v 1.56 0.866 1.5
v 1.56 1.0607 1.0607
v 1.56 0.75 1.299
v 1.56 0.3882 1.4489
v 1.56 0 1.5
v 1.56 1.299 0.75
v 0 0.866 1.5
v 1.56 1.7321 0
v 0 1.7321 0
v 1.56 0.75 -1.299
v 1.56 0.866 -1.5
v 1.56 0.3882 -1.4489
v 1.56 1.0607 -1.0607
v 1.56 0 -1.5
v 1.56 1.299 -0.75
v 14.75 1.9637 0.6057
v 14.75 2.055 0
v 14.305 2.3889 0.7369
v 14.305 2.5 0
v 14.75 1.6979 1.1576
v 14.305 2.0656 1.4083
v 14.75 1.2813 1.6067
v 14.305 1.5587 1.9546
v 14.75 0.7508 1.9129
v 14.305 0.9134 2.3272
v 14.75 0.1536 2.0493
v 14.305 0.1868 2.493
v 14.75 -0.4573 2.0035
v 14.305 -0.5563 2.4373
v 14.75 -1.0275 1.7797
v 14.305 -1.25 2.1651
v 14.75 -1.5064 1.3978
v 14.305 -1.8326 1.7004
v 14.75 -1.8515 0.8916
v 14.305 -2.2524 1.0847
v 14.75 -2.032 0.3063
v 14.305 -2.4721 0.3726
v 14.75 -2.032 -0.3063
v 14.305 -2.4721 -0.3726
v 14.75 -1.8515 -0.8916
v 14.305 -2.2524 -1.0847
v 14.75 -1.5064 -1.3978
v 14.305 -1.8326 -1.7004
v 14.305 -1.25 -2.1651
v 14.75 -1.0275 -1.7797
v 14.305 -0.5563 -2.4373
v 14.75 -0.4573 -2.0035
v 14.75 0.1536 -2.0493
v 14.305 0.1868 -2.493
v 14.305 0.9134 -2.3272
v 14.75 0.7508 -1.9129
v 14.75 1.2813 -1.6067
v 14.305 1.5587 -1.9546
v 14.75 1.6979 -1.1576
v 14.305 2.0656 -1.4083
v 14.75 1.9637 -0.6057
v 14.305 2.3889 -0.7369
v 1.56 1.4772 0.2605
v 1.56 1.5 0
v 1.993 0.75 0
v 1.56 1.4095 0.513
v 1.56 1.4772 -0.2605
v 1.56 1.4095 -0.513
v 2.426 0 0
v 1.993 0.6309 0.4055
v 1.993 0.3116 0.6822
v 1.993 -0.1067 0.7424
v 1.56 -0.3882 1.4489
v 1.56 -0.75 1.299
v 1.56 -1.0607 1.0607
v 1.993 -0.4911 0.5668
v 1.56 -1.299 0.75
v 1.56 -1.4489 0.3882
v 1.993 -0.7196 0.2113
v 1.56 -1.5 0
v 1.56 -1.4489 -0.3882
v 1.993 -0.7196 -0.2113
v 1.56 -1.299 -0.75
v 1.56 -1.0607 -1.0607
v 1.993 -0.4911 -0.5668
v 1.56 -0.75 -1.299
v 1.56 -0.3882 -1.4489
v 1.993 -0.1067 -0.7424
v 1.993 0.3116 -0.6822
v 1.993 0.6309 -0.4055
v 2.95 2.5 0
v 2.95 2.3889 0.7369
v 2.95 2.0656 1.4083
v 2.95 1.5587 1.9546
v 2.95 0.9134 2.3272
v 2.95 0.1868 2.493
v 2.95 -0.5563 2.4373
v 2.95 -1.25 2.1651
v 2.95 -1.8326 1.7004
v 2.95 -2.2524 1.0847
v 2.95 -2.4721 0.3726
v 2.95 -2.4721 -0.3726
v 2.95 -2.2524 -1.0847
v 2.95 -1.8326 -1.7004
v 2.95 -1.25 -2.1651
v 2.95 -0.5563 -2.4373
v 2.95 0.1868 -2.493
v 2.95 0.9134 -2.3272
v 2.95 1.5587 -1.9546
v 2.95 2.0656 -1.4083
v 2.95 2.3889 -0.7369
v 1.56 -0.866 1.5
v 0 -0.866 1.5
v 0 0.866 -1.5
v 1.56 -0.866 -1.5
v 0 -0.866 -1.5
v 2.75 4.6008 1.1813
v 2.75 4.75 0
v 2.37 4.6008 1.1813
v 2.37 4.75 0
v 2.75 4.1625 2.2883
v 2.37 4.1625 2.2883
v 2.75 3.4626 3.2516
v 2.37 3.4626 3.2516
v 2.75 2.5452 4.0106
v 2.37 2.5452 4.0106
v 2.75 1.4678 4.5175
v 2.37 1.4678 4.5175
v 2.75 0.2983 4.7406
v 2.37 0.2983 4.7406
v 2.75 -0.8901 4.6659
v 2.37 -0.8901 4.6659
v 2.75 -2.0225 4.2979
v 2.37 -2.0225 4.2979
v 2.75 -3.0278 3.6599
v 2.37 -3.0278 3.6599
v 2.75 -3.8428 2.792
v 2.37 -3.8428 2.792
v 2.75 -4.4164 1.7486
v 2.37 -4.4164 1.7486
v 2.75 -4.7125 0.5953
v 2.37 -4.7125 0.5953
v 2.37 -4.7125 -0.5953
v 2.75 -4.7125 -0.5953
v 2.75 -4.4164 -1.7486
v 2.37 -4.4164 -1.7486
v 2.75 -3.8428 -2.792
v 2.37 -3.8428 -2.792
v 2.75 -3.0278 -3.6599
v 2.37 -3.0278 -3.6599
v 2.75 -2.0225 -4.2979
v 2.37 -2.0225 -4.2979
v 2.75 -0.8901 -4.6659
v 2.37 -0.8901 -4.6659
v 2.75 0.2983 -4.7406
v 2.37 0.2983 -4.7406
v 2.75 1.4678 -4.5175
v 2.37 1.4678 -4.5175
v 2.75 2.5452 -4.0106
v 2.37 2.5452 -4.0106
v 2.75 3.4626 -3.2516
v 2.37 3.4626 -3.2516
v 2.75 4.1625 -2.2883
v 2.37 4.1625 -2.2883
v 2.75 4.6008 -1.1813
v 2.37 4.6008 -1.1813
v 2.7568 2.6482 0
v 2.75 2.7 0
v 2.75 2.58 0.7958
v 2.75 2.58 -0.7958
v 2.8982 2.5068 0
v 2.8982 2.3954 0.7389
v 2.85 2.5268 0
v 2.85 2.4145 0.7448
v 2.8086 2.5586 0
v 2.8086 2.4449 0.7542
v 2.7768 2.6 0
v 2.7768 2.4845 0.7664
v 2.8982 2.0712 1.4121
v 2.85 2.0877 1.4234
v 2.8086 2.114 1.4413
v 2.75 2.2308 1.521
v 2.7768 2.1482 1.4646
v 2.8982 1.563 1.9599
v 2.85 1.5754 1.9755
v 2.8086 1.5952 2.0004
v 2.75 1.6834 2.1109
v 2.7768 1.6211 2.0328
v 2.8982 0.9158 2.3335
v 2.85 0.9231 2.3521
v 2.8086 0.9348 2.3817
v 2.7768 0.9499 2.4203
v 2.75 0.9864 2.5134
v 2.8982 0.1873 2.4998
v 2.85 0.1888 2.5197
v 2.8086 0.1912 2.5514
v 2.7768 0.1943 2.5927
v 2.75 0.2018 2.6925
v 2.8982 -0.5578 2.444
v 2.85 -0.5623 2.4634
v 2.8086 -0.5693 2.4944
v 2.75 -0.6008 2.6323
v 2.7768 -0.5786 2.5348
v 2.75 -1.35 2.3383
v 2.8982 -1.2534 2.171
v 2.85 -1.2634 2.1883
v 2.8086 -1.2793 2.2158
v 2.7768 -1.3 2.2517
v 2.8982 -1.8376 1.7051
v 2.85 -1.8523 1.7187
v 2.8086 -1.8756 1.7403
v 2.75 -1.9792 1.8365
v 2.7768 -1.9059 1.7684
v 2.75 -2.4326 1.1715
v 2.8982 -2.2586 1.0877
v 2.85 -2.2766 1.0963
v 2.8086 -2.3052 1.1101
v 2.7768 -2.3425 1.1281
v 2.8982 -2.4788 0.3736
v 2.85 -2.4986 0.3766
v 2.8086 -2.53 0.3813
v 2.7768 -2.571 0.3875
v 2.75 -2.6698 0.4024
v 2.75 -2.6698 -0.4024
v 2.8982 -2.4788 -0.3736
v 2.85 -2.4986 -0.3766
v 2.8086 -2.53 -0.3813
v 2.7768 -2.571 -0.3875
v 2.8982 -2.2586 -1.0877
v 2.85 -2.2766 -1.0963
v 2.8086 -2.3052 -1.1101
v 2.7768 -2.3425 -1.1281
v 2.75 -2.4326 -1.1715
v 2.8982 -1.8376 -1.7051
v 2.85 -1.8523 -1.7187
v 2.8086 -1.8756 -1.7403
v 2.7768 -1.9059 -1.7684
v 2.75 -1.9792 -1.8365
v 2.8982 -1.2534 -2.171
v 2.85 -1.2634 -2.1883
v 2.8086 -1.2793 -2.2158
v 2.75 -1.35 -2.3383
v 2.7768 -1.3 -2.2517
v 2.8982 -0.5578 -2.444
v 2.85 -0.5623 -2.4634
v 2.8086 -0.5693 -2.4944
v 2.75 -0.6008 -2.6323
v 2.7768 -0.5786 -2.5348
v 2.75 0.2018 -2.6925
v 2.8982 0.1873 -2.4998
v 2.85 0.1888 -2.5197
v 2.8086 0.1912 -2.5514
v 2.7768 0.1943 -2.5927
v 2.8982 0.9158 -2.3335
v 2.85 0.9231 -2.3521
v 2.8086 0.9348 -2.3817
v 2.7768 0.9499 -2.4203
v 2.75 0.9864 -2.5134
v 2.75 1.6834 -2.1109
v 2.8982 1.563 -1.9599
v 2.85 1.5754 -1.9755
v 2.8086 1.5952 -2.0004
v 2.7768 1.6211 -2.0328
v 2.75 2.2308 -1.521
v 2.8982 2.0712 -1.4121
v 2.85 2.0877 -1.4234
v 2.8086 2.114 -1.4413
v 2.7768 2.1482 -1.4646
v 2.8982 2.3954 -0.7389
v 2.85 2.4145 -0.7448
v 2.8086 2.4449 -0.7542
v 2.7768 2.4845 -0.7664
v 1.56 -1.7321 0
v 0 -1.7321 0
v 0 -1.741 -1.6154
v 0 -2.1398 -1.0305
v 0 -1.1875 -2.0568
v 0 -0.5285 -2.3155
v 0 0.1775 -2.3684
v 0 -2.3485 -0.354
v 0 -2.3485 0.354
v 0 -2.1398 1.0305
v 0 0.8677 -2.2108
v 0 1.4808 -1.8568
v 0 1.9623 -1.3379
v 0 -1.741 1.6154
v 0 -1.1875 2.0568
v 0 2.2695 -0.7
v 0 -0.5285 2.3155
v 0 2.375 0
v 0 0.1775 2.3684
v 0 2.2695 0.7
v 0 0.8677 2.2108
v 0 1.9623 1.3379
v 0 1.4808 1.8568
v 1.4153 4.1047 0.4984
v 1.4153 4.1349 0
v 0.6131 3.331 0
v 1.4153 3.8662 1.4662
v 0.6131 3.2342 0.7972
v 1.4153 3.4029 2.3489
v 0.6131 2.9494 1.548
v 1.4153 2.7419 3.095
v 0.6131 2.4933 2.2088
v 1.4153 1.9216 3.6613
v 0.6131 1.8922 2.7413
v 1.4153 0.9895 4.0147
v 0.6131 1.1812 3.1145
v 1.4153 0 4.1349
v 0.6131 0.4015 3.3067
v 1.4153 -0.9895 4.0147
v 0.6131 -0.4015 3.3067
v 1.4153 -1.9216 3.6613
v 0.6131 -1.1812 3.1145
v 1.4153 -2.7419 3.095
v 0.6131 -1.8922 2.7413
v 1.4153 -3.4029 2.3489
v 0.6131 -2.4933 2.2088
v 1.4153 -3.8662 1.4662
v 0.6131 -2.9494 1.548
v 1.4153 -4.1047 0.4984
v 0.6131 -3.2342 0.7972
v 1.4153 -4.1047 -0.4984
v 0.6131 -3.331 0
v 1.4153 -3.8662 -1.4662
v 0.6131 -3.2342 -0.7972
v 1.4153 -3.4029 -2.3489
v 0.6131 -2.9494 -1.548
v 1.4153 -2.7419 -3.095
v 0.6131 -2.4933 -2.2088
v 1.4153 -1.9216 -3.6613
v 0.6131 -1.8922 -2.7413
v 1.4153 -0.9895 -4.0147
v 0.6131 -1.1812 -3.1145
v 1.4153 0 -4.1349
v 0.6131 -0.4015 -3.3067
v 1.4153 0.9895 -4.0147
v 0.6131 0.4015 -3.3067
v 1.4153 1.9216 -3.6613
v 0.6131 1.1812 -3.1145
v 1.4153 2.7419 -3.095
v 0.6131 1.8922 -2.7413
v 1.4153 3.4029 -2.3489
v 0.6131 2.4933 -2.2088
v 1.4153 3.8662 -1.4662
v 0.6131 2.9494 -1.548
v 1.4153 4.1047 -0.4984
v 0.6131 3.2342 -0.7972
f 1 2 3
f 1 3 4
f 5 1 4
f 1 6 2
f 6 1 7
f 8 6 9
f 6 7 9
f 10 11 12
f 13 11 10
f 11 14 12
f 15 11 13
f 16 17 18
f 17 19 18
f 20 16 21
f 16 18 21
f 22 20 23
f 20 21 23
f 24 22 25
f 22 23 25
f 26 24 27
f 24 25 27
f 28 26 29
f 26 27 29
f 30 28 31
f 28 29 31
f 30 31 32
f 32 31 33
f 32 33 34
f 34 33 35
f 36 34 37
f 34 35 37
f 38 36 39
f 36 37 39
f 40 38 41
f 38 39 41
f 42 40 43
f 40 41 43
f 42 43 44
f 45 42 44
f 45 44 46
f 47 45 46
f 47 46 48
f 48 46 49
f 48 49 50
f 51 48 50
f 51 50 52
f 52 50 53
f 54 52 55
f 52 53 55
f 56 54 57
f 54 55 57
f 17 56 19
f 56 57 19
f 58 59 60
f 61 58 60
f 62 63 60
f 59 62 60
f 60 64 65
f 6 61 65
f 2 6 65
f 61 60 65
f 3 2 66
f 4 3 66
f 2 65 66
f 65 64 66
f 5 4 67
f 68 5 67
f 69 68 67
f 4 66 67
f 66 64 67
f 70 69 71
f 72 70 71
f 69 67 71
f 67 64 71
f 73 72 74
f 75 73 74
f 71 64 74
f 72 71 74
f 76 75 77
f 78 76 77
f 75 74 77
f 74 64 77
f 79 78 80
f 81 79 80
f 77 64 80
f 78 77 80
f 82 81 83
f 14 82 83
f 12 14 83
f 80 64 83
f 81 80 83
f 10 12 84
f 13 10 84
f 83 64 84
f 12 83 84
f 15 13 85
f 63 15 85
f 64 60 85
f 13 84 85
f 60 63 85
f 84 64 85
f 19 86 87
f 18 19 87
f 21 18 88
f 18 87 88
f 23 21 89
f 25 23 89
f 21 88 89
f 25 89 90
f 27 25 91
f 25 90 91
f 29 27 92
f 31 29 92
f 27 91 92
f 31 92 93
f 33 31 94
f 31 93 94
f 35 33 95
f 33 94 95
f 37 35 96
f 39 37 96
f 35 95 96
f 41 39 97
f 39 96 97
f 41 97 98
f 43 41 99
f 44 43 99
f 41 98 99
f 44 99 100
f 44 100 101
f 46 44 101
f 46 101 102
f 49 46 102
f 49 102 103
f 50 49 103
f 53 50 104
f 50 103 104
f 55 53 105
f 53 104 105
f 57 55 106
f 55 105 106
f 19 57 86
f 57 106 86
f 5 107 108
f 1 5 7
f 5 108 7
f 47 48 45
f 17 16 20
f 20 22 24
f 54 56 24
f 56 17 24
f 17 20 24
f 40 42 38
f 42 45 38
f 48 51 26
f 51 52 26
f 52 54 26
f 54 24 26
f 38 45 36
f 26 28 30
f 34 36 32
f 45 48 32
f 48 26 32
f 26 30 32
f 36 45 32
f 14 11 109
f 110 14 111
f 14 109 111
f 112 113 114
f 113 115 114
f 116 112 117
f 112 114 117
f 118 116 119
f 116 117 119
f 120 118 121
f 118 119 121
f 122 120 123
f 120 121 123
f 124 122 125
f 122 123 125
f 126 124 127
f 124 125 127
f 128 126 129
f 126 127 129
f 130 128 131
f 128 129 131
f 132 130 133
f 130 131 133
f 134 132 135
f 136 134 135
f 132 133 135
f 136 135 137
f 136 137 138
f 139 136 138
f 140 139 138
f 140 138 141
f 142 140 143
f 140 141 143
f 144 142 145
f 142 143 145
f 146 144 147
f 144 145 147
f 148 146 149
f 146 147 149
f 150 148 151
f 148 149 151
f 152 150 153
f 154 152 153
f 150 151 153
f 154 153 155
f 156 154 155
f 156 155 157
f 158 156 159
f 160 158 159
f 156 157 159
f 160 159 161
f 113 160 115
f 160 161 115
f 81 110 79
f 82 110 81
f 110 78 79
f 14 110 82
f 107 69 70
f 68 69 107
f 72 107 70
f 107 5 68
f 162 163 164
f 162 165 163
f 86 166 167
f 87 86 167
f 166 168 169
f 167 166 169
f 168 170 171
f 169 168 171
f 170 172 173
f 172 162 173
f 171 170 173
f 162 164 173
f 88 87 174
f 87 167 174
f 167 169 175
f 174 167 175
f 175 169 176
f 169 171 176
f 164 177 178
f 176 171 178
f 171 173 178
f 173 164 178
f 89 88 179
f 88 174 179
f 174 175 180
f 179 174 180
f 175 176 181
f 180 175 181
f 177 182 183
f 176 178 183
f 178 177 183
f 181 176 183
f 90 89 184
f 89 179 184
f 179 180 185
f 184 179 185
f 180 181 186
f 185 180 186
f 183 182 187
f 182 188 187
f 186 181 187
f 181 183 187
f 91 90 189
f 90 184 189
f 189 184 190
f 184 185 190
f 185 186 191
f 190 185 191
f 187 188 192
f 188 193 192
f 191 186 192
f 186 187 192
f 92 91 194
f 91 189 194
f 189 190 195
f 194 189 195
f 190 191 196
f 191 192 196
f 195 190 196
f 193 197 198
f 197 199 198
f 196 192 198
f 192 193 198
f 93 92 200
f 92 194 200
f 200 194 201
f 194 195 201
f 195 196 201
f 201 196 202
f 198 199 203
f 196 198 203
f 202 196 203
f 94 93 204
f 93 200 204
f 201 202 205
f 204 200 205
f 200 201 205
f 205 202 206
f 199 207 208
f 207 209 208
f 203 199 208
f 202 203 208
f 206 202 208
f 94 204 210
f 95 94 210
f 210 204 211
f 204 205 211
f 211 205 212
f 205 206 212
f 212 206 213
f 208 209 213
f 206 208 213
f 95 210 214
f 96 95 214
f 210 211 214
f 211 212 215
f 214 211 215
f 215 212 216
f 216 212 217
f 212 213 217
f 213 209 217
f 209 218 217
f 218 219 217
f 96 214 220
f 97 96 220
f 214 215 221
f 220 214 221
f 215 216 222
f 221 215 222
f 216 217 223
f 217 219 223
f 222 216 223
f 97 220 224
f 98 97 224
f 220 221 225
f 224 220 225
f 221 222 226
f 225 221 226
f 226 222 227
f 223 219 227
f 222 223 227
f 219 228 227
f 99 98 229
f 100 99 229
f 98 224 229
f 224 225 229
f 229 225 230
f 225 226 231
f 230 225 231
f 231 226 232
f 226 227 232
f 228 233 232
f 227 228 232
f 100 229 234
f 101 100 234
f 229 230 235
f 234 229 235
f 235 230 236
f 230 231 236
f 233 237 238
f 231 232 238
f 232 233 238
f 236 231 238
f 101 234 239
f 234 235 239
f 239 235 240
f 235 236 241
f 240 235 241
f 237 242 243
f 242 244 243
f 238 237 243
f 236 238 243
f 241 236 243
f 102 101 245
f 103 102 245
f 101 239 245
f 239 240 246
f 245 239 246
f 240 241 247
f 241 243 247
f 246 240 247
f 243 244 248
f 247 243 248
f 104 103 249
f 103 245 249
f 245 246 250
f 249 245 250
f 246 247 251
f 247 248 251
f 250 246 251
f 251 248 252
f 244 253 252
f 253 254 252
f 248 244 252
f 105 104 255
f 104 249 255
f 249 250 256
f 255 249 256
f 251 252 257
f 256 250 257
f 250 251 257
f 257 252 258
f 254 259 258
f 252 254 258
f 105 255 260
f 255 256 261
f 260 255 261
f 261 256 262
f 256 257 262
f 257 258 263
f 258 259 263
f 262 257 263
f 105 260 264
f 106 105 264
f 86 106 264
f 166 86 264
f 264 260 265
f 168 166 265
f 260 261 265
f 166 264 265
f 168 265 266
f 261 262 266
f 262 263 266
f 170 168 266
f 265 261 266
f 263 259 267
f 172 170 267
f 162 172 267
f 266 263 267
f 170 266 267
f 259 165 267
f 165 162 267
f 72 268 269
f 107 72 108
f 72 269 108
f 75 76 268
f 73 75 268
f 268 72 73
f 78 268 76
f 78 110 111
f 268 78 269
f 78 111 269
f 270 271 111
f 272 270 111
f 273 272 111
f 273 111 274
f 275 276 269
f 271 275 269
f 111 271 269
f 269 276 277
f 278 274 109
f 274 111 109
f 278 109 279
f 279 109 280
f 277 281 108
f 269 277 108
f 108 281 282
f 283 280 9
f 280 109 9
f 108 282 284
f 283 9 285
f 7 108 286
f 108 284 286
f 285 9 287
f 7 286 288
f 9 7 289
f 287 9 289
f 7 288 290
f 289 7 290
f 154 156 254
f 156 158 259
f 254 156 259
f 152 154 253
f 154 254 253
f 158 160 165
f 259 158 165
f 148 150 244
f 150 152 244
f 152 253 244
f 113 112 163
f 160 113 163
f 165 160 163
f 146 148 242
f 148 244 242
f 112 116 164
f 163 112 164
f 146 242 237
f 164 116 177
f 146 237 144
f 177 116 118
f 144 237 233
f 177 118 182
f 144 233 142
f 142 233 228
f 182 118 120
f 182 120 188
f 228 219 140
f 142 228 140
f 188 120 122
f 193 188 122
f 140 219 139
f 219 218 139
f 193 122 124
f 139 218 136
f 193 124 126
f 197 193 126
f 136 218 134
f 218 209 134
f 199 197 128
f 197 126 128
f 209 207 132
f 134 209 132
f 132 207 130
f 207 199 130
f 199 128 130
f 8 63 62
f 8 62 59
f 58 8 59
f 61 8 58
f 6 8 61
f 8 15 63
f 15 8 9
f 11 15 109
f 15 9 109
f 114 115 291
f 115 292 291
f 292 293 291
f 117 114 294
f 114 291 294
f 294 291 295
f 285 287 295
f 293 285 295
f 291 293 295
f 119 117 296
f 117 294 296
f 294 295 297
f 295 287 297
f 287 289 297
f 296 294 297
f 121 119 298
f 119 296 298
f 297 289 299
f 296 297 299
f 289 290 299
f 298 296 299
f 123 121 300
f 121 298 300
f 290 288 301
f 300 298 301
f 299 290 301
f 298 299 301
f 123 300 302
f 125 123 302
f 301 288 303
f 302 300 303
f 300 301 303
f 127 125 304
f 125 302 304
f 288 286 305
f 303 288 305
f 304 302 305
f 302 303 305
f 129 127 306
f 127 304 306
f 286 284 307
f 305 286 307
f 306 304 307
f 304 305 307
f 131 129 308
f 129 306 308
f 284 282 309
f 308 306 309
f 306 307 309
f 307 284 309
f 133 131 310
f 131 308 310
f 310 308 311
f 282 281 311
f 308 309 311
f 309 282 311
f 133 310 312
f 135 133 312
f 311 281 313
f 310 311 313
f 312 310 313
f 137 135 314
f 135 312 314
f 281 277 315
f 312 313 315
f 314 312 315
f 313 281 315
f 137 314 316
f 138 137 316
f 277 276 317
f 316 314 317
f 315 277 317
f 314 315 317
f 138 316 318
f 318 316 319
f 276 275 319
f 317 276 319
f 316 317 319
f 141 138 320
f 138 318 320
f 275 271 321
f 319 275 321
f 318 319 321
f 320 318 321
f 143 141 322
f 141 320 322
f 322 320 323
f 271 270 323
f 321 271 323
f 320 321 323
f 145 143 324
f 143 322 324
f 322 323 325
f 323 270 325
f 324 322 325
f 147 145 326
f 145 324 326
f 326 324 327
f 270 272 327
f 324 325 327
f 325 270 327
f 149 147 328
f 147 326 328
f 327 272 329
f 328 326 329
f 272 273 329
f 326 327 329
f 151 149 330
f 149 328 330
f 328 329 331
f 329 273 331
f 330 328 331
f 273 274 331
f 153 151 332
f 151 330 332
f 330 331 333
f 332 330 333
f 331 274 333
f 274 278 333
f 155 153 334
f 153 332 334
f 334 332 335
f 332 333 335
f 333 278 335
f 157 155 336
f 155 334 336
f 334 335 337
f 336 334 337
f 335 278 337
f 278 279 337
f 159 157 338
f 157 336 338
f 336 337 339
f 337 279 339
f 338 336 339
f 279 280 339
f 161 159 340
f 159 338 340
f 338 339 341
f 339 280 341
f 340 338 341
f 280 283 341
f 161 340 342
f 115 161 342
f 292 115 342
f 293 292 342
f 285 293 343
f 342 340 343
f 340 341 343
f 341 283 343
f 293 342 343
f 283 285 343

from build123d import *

# Parameters (mm, degrees)
FILLET1_R   = 0.2
HEX_2_DEPTH = 1.56


with BuildPart() as part:
    # BodySke → BaseBody (revolve)
    with BuildSketch(Plane.XY):
        with BuildLine():
            Line((14.75, 0), (14.75, 2.055))
            Line((14.75, 2.055), (14.305, 2.5))
            Line((14.305, 2.5), (2.75, 2.5))
            Line((2.75, 2.5), (2.75, 4.75))
            Line((2.75, 4.75), (2.37, 4.75))
            ThreePointArc((2.37, 4.75), (0.992680215, 3.754414901), (0, 2.375))
            Line((0, 2.375), (0, 0))
            Line((0, 0), (14.75, 0))
        make_face()
    revolve(axis=Axis((0, 0, 0), (1, 0, 0)))

    # Fillet1
    fillet1_edges = [part.edges().sort_by_distance(p)[0] for p in [
        (2.75, -2.5, 0),
    ]]
    fillet(fillet1_edges, radius=FILLET1_R)

    # Sketch2 → PreBroach (revolve, cut)
    with BuildSketch(Plane.XY):
        Polygon((0, 1.5), (1.56, 1.5), (2.426025404, 0), (0, 0), align=None)
    revolve(axis=Axis((0, 0, 0), (1, 0, 0)), mode=Mode.SUBTRACT)

    # Sketch3 → Hex 2 (cut)
    with BuildSketch(Plane(origin=(0, 0, 0), x_dir=(0, 0, -1), z_dir=(1, 0, 0))):
        Polygon((-1.5, -0.866025404), (-1.5, 0.866025404), (0, 1.732050808), (1.5, 0.866025404), (1.5, -0.866025404), (0, -1.732050808), align=None)
    extrude(amount=HEX_2_DEPTH, mode=Mode.SUBTRACT)


solid = part.part
